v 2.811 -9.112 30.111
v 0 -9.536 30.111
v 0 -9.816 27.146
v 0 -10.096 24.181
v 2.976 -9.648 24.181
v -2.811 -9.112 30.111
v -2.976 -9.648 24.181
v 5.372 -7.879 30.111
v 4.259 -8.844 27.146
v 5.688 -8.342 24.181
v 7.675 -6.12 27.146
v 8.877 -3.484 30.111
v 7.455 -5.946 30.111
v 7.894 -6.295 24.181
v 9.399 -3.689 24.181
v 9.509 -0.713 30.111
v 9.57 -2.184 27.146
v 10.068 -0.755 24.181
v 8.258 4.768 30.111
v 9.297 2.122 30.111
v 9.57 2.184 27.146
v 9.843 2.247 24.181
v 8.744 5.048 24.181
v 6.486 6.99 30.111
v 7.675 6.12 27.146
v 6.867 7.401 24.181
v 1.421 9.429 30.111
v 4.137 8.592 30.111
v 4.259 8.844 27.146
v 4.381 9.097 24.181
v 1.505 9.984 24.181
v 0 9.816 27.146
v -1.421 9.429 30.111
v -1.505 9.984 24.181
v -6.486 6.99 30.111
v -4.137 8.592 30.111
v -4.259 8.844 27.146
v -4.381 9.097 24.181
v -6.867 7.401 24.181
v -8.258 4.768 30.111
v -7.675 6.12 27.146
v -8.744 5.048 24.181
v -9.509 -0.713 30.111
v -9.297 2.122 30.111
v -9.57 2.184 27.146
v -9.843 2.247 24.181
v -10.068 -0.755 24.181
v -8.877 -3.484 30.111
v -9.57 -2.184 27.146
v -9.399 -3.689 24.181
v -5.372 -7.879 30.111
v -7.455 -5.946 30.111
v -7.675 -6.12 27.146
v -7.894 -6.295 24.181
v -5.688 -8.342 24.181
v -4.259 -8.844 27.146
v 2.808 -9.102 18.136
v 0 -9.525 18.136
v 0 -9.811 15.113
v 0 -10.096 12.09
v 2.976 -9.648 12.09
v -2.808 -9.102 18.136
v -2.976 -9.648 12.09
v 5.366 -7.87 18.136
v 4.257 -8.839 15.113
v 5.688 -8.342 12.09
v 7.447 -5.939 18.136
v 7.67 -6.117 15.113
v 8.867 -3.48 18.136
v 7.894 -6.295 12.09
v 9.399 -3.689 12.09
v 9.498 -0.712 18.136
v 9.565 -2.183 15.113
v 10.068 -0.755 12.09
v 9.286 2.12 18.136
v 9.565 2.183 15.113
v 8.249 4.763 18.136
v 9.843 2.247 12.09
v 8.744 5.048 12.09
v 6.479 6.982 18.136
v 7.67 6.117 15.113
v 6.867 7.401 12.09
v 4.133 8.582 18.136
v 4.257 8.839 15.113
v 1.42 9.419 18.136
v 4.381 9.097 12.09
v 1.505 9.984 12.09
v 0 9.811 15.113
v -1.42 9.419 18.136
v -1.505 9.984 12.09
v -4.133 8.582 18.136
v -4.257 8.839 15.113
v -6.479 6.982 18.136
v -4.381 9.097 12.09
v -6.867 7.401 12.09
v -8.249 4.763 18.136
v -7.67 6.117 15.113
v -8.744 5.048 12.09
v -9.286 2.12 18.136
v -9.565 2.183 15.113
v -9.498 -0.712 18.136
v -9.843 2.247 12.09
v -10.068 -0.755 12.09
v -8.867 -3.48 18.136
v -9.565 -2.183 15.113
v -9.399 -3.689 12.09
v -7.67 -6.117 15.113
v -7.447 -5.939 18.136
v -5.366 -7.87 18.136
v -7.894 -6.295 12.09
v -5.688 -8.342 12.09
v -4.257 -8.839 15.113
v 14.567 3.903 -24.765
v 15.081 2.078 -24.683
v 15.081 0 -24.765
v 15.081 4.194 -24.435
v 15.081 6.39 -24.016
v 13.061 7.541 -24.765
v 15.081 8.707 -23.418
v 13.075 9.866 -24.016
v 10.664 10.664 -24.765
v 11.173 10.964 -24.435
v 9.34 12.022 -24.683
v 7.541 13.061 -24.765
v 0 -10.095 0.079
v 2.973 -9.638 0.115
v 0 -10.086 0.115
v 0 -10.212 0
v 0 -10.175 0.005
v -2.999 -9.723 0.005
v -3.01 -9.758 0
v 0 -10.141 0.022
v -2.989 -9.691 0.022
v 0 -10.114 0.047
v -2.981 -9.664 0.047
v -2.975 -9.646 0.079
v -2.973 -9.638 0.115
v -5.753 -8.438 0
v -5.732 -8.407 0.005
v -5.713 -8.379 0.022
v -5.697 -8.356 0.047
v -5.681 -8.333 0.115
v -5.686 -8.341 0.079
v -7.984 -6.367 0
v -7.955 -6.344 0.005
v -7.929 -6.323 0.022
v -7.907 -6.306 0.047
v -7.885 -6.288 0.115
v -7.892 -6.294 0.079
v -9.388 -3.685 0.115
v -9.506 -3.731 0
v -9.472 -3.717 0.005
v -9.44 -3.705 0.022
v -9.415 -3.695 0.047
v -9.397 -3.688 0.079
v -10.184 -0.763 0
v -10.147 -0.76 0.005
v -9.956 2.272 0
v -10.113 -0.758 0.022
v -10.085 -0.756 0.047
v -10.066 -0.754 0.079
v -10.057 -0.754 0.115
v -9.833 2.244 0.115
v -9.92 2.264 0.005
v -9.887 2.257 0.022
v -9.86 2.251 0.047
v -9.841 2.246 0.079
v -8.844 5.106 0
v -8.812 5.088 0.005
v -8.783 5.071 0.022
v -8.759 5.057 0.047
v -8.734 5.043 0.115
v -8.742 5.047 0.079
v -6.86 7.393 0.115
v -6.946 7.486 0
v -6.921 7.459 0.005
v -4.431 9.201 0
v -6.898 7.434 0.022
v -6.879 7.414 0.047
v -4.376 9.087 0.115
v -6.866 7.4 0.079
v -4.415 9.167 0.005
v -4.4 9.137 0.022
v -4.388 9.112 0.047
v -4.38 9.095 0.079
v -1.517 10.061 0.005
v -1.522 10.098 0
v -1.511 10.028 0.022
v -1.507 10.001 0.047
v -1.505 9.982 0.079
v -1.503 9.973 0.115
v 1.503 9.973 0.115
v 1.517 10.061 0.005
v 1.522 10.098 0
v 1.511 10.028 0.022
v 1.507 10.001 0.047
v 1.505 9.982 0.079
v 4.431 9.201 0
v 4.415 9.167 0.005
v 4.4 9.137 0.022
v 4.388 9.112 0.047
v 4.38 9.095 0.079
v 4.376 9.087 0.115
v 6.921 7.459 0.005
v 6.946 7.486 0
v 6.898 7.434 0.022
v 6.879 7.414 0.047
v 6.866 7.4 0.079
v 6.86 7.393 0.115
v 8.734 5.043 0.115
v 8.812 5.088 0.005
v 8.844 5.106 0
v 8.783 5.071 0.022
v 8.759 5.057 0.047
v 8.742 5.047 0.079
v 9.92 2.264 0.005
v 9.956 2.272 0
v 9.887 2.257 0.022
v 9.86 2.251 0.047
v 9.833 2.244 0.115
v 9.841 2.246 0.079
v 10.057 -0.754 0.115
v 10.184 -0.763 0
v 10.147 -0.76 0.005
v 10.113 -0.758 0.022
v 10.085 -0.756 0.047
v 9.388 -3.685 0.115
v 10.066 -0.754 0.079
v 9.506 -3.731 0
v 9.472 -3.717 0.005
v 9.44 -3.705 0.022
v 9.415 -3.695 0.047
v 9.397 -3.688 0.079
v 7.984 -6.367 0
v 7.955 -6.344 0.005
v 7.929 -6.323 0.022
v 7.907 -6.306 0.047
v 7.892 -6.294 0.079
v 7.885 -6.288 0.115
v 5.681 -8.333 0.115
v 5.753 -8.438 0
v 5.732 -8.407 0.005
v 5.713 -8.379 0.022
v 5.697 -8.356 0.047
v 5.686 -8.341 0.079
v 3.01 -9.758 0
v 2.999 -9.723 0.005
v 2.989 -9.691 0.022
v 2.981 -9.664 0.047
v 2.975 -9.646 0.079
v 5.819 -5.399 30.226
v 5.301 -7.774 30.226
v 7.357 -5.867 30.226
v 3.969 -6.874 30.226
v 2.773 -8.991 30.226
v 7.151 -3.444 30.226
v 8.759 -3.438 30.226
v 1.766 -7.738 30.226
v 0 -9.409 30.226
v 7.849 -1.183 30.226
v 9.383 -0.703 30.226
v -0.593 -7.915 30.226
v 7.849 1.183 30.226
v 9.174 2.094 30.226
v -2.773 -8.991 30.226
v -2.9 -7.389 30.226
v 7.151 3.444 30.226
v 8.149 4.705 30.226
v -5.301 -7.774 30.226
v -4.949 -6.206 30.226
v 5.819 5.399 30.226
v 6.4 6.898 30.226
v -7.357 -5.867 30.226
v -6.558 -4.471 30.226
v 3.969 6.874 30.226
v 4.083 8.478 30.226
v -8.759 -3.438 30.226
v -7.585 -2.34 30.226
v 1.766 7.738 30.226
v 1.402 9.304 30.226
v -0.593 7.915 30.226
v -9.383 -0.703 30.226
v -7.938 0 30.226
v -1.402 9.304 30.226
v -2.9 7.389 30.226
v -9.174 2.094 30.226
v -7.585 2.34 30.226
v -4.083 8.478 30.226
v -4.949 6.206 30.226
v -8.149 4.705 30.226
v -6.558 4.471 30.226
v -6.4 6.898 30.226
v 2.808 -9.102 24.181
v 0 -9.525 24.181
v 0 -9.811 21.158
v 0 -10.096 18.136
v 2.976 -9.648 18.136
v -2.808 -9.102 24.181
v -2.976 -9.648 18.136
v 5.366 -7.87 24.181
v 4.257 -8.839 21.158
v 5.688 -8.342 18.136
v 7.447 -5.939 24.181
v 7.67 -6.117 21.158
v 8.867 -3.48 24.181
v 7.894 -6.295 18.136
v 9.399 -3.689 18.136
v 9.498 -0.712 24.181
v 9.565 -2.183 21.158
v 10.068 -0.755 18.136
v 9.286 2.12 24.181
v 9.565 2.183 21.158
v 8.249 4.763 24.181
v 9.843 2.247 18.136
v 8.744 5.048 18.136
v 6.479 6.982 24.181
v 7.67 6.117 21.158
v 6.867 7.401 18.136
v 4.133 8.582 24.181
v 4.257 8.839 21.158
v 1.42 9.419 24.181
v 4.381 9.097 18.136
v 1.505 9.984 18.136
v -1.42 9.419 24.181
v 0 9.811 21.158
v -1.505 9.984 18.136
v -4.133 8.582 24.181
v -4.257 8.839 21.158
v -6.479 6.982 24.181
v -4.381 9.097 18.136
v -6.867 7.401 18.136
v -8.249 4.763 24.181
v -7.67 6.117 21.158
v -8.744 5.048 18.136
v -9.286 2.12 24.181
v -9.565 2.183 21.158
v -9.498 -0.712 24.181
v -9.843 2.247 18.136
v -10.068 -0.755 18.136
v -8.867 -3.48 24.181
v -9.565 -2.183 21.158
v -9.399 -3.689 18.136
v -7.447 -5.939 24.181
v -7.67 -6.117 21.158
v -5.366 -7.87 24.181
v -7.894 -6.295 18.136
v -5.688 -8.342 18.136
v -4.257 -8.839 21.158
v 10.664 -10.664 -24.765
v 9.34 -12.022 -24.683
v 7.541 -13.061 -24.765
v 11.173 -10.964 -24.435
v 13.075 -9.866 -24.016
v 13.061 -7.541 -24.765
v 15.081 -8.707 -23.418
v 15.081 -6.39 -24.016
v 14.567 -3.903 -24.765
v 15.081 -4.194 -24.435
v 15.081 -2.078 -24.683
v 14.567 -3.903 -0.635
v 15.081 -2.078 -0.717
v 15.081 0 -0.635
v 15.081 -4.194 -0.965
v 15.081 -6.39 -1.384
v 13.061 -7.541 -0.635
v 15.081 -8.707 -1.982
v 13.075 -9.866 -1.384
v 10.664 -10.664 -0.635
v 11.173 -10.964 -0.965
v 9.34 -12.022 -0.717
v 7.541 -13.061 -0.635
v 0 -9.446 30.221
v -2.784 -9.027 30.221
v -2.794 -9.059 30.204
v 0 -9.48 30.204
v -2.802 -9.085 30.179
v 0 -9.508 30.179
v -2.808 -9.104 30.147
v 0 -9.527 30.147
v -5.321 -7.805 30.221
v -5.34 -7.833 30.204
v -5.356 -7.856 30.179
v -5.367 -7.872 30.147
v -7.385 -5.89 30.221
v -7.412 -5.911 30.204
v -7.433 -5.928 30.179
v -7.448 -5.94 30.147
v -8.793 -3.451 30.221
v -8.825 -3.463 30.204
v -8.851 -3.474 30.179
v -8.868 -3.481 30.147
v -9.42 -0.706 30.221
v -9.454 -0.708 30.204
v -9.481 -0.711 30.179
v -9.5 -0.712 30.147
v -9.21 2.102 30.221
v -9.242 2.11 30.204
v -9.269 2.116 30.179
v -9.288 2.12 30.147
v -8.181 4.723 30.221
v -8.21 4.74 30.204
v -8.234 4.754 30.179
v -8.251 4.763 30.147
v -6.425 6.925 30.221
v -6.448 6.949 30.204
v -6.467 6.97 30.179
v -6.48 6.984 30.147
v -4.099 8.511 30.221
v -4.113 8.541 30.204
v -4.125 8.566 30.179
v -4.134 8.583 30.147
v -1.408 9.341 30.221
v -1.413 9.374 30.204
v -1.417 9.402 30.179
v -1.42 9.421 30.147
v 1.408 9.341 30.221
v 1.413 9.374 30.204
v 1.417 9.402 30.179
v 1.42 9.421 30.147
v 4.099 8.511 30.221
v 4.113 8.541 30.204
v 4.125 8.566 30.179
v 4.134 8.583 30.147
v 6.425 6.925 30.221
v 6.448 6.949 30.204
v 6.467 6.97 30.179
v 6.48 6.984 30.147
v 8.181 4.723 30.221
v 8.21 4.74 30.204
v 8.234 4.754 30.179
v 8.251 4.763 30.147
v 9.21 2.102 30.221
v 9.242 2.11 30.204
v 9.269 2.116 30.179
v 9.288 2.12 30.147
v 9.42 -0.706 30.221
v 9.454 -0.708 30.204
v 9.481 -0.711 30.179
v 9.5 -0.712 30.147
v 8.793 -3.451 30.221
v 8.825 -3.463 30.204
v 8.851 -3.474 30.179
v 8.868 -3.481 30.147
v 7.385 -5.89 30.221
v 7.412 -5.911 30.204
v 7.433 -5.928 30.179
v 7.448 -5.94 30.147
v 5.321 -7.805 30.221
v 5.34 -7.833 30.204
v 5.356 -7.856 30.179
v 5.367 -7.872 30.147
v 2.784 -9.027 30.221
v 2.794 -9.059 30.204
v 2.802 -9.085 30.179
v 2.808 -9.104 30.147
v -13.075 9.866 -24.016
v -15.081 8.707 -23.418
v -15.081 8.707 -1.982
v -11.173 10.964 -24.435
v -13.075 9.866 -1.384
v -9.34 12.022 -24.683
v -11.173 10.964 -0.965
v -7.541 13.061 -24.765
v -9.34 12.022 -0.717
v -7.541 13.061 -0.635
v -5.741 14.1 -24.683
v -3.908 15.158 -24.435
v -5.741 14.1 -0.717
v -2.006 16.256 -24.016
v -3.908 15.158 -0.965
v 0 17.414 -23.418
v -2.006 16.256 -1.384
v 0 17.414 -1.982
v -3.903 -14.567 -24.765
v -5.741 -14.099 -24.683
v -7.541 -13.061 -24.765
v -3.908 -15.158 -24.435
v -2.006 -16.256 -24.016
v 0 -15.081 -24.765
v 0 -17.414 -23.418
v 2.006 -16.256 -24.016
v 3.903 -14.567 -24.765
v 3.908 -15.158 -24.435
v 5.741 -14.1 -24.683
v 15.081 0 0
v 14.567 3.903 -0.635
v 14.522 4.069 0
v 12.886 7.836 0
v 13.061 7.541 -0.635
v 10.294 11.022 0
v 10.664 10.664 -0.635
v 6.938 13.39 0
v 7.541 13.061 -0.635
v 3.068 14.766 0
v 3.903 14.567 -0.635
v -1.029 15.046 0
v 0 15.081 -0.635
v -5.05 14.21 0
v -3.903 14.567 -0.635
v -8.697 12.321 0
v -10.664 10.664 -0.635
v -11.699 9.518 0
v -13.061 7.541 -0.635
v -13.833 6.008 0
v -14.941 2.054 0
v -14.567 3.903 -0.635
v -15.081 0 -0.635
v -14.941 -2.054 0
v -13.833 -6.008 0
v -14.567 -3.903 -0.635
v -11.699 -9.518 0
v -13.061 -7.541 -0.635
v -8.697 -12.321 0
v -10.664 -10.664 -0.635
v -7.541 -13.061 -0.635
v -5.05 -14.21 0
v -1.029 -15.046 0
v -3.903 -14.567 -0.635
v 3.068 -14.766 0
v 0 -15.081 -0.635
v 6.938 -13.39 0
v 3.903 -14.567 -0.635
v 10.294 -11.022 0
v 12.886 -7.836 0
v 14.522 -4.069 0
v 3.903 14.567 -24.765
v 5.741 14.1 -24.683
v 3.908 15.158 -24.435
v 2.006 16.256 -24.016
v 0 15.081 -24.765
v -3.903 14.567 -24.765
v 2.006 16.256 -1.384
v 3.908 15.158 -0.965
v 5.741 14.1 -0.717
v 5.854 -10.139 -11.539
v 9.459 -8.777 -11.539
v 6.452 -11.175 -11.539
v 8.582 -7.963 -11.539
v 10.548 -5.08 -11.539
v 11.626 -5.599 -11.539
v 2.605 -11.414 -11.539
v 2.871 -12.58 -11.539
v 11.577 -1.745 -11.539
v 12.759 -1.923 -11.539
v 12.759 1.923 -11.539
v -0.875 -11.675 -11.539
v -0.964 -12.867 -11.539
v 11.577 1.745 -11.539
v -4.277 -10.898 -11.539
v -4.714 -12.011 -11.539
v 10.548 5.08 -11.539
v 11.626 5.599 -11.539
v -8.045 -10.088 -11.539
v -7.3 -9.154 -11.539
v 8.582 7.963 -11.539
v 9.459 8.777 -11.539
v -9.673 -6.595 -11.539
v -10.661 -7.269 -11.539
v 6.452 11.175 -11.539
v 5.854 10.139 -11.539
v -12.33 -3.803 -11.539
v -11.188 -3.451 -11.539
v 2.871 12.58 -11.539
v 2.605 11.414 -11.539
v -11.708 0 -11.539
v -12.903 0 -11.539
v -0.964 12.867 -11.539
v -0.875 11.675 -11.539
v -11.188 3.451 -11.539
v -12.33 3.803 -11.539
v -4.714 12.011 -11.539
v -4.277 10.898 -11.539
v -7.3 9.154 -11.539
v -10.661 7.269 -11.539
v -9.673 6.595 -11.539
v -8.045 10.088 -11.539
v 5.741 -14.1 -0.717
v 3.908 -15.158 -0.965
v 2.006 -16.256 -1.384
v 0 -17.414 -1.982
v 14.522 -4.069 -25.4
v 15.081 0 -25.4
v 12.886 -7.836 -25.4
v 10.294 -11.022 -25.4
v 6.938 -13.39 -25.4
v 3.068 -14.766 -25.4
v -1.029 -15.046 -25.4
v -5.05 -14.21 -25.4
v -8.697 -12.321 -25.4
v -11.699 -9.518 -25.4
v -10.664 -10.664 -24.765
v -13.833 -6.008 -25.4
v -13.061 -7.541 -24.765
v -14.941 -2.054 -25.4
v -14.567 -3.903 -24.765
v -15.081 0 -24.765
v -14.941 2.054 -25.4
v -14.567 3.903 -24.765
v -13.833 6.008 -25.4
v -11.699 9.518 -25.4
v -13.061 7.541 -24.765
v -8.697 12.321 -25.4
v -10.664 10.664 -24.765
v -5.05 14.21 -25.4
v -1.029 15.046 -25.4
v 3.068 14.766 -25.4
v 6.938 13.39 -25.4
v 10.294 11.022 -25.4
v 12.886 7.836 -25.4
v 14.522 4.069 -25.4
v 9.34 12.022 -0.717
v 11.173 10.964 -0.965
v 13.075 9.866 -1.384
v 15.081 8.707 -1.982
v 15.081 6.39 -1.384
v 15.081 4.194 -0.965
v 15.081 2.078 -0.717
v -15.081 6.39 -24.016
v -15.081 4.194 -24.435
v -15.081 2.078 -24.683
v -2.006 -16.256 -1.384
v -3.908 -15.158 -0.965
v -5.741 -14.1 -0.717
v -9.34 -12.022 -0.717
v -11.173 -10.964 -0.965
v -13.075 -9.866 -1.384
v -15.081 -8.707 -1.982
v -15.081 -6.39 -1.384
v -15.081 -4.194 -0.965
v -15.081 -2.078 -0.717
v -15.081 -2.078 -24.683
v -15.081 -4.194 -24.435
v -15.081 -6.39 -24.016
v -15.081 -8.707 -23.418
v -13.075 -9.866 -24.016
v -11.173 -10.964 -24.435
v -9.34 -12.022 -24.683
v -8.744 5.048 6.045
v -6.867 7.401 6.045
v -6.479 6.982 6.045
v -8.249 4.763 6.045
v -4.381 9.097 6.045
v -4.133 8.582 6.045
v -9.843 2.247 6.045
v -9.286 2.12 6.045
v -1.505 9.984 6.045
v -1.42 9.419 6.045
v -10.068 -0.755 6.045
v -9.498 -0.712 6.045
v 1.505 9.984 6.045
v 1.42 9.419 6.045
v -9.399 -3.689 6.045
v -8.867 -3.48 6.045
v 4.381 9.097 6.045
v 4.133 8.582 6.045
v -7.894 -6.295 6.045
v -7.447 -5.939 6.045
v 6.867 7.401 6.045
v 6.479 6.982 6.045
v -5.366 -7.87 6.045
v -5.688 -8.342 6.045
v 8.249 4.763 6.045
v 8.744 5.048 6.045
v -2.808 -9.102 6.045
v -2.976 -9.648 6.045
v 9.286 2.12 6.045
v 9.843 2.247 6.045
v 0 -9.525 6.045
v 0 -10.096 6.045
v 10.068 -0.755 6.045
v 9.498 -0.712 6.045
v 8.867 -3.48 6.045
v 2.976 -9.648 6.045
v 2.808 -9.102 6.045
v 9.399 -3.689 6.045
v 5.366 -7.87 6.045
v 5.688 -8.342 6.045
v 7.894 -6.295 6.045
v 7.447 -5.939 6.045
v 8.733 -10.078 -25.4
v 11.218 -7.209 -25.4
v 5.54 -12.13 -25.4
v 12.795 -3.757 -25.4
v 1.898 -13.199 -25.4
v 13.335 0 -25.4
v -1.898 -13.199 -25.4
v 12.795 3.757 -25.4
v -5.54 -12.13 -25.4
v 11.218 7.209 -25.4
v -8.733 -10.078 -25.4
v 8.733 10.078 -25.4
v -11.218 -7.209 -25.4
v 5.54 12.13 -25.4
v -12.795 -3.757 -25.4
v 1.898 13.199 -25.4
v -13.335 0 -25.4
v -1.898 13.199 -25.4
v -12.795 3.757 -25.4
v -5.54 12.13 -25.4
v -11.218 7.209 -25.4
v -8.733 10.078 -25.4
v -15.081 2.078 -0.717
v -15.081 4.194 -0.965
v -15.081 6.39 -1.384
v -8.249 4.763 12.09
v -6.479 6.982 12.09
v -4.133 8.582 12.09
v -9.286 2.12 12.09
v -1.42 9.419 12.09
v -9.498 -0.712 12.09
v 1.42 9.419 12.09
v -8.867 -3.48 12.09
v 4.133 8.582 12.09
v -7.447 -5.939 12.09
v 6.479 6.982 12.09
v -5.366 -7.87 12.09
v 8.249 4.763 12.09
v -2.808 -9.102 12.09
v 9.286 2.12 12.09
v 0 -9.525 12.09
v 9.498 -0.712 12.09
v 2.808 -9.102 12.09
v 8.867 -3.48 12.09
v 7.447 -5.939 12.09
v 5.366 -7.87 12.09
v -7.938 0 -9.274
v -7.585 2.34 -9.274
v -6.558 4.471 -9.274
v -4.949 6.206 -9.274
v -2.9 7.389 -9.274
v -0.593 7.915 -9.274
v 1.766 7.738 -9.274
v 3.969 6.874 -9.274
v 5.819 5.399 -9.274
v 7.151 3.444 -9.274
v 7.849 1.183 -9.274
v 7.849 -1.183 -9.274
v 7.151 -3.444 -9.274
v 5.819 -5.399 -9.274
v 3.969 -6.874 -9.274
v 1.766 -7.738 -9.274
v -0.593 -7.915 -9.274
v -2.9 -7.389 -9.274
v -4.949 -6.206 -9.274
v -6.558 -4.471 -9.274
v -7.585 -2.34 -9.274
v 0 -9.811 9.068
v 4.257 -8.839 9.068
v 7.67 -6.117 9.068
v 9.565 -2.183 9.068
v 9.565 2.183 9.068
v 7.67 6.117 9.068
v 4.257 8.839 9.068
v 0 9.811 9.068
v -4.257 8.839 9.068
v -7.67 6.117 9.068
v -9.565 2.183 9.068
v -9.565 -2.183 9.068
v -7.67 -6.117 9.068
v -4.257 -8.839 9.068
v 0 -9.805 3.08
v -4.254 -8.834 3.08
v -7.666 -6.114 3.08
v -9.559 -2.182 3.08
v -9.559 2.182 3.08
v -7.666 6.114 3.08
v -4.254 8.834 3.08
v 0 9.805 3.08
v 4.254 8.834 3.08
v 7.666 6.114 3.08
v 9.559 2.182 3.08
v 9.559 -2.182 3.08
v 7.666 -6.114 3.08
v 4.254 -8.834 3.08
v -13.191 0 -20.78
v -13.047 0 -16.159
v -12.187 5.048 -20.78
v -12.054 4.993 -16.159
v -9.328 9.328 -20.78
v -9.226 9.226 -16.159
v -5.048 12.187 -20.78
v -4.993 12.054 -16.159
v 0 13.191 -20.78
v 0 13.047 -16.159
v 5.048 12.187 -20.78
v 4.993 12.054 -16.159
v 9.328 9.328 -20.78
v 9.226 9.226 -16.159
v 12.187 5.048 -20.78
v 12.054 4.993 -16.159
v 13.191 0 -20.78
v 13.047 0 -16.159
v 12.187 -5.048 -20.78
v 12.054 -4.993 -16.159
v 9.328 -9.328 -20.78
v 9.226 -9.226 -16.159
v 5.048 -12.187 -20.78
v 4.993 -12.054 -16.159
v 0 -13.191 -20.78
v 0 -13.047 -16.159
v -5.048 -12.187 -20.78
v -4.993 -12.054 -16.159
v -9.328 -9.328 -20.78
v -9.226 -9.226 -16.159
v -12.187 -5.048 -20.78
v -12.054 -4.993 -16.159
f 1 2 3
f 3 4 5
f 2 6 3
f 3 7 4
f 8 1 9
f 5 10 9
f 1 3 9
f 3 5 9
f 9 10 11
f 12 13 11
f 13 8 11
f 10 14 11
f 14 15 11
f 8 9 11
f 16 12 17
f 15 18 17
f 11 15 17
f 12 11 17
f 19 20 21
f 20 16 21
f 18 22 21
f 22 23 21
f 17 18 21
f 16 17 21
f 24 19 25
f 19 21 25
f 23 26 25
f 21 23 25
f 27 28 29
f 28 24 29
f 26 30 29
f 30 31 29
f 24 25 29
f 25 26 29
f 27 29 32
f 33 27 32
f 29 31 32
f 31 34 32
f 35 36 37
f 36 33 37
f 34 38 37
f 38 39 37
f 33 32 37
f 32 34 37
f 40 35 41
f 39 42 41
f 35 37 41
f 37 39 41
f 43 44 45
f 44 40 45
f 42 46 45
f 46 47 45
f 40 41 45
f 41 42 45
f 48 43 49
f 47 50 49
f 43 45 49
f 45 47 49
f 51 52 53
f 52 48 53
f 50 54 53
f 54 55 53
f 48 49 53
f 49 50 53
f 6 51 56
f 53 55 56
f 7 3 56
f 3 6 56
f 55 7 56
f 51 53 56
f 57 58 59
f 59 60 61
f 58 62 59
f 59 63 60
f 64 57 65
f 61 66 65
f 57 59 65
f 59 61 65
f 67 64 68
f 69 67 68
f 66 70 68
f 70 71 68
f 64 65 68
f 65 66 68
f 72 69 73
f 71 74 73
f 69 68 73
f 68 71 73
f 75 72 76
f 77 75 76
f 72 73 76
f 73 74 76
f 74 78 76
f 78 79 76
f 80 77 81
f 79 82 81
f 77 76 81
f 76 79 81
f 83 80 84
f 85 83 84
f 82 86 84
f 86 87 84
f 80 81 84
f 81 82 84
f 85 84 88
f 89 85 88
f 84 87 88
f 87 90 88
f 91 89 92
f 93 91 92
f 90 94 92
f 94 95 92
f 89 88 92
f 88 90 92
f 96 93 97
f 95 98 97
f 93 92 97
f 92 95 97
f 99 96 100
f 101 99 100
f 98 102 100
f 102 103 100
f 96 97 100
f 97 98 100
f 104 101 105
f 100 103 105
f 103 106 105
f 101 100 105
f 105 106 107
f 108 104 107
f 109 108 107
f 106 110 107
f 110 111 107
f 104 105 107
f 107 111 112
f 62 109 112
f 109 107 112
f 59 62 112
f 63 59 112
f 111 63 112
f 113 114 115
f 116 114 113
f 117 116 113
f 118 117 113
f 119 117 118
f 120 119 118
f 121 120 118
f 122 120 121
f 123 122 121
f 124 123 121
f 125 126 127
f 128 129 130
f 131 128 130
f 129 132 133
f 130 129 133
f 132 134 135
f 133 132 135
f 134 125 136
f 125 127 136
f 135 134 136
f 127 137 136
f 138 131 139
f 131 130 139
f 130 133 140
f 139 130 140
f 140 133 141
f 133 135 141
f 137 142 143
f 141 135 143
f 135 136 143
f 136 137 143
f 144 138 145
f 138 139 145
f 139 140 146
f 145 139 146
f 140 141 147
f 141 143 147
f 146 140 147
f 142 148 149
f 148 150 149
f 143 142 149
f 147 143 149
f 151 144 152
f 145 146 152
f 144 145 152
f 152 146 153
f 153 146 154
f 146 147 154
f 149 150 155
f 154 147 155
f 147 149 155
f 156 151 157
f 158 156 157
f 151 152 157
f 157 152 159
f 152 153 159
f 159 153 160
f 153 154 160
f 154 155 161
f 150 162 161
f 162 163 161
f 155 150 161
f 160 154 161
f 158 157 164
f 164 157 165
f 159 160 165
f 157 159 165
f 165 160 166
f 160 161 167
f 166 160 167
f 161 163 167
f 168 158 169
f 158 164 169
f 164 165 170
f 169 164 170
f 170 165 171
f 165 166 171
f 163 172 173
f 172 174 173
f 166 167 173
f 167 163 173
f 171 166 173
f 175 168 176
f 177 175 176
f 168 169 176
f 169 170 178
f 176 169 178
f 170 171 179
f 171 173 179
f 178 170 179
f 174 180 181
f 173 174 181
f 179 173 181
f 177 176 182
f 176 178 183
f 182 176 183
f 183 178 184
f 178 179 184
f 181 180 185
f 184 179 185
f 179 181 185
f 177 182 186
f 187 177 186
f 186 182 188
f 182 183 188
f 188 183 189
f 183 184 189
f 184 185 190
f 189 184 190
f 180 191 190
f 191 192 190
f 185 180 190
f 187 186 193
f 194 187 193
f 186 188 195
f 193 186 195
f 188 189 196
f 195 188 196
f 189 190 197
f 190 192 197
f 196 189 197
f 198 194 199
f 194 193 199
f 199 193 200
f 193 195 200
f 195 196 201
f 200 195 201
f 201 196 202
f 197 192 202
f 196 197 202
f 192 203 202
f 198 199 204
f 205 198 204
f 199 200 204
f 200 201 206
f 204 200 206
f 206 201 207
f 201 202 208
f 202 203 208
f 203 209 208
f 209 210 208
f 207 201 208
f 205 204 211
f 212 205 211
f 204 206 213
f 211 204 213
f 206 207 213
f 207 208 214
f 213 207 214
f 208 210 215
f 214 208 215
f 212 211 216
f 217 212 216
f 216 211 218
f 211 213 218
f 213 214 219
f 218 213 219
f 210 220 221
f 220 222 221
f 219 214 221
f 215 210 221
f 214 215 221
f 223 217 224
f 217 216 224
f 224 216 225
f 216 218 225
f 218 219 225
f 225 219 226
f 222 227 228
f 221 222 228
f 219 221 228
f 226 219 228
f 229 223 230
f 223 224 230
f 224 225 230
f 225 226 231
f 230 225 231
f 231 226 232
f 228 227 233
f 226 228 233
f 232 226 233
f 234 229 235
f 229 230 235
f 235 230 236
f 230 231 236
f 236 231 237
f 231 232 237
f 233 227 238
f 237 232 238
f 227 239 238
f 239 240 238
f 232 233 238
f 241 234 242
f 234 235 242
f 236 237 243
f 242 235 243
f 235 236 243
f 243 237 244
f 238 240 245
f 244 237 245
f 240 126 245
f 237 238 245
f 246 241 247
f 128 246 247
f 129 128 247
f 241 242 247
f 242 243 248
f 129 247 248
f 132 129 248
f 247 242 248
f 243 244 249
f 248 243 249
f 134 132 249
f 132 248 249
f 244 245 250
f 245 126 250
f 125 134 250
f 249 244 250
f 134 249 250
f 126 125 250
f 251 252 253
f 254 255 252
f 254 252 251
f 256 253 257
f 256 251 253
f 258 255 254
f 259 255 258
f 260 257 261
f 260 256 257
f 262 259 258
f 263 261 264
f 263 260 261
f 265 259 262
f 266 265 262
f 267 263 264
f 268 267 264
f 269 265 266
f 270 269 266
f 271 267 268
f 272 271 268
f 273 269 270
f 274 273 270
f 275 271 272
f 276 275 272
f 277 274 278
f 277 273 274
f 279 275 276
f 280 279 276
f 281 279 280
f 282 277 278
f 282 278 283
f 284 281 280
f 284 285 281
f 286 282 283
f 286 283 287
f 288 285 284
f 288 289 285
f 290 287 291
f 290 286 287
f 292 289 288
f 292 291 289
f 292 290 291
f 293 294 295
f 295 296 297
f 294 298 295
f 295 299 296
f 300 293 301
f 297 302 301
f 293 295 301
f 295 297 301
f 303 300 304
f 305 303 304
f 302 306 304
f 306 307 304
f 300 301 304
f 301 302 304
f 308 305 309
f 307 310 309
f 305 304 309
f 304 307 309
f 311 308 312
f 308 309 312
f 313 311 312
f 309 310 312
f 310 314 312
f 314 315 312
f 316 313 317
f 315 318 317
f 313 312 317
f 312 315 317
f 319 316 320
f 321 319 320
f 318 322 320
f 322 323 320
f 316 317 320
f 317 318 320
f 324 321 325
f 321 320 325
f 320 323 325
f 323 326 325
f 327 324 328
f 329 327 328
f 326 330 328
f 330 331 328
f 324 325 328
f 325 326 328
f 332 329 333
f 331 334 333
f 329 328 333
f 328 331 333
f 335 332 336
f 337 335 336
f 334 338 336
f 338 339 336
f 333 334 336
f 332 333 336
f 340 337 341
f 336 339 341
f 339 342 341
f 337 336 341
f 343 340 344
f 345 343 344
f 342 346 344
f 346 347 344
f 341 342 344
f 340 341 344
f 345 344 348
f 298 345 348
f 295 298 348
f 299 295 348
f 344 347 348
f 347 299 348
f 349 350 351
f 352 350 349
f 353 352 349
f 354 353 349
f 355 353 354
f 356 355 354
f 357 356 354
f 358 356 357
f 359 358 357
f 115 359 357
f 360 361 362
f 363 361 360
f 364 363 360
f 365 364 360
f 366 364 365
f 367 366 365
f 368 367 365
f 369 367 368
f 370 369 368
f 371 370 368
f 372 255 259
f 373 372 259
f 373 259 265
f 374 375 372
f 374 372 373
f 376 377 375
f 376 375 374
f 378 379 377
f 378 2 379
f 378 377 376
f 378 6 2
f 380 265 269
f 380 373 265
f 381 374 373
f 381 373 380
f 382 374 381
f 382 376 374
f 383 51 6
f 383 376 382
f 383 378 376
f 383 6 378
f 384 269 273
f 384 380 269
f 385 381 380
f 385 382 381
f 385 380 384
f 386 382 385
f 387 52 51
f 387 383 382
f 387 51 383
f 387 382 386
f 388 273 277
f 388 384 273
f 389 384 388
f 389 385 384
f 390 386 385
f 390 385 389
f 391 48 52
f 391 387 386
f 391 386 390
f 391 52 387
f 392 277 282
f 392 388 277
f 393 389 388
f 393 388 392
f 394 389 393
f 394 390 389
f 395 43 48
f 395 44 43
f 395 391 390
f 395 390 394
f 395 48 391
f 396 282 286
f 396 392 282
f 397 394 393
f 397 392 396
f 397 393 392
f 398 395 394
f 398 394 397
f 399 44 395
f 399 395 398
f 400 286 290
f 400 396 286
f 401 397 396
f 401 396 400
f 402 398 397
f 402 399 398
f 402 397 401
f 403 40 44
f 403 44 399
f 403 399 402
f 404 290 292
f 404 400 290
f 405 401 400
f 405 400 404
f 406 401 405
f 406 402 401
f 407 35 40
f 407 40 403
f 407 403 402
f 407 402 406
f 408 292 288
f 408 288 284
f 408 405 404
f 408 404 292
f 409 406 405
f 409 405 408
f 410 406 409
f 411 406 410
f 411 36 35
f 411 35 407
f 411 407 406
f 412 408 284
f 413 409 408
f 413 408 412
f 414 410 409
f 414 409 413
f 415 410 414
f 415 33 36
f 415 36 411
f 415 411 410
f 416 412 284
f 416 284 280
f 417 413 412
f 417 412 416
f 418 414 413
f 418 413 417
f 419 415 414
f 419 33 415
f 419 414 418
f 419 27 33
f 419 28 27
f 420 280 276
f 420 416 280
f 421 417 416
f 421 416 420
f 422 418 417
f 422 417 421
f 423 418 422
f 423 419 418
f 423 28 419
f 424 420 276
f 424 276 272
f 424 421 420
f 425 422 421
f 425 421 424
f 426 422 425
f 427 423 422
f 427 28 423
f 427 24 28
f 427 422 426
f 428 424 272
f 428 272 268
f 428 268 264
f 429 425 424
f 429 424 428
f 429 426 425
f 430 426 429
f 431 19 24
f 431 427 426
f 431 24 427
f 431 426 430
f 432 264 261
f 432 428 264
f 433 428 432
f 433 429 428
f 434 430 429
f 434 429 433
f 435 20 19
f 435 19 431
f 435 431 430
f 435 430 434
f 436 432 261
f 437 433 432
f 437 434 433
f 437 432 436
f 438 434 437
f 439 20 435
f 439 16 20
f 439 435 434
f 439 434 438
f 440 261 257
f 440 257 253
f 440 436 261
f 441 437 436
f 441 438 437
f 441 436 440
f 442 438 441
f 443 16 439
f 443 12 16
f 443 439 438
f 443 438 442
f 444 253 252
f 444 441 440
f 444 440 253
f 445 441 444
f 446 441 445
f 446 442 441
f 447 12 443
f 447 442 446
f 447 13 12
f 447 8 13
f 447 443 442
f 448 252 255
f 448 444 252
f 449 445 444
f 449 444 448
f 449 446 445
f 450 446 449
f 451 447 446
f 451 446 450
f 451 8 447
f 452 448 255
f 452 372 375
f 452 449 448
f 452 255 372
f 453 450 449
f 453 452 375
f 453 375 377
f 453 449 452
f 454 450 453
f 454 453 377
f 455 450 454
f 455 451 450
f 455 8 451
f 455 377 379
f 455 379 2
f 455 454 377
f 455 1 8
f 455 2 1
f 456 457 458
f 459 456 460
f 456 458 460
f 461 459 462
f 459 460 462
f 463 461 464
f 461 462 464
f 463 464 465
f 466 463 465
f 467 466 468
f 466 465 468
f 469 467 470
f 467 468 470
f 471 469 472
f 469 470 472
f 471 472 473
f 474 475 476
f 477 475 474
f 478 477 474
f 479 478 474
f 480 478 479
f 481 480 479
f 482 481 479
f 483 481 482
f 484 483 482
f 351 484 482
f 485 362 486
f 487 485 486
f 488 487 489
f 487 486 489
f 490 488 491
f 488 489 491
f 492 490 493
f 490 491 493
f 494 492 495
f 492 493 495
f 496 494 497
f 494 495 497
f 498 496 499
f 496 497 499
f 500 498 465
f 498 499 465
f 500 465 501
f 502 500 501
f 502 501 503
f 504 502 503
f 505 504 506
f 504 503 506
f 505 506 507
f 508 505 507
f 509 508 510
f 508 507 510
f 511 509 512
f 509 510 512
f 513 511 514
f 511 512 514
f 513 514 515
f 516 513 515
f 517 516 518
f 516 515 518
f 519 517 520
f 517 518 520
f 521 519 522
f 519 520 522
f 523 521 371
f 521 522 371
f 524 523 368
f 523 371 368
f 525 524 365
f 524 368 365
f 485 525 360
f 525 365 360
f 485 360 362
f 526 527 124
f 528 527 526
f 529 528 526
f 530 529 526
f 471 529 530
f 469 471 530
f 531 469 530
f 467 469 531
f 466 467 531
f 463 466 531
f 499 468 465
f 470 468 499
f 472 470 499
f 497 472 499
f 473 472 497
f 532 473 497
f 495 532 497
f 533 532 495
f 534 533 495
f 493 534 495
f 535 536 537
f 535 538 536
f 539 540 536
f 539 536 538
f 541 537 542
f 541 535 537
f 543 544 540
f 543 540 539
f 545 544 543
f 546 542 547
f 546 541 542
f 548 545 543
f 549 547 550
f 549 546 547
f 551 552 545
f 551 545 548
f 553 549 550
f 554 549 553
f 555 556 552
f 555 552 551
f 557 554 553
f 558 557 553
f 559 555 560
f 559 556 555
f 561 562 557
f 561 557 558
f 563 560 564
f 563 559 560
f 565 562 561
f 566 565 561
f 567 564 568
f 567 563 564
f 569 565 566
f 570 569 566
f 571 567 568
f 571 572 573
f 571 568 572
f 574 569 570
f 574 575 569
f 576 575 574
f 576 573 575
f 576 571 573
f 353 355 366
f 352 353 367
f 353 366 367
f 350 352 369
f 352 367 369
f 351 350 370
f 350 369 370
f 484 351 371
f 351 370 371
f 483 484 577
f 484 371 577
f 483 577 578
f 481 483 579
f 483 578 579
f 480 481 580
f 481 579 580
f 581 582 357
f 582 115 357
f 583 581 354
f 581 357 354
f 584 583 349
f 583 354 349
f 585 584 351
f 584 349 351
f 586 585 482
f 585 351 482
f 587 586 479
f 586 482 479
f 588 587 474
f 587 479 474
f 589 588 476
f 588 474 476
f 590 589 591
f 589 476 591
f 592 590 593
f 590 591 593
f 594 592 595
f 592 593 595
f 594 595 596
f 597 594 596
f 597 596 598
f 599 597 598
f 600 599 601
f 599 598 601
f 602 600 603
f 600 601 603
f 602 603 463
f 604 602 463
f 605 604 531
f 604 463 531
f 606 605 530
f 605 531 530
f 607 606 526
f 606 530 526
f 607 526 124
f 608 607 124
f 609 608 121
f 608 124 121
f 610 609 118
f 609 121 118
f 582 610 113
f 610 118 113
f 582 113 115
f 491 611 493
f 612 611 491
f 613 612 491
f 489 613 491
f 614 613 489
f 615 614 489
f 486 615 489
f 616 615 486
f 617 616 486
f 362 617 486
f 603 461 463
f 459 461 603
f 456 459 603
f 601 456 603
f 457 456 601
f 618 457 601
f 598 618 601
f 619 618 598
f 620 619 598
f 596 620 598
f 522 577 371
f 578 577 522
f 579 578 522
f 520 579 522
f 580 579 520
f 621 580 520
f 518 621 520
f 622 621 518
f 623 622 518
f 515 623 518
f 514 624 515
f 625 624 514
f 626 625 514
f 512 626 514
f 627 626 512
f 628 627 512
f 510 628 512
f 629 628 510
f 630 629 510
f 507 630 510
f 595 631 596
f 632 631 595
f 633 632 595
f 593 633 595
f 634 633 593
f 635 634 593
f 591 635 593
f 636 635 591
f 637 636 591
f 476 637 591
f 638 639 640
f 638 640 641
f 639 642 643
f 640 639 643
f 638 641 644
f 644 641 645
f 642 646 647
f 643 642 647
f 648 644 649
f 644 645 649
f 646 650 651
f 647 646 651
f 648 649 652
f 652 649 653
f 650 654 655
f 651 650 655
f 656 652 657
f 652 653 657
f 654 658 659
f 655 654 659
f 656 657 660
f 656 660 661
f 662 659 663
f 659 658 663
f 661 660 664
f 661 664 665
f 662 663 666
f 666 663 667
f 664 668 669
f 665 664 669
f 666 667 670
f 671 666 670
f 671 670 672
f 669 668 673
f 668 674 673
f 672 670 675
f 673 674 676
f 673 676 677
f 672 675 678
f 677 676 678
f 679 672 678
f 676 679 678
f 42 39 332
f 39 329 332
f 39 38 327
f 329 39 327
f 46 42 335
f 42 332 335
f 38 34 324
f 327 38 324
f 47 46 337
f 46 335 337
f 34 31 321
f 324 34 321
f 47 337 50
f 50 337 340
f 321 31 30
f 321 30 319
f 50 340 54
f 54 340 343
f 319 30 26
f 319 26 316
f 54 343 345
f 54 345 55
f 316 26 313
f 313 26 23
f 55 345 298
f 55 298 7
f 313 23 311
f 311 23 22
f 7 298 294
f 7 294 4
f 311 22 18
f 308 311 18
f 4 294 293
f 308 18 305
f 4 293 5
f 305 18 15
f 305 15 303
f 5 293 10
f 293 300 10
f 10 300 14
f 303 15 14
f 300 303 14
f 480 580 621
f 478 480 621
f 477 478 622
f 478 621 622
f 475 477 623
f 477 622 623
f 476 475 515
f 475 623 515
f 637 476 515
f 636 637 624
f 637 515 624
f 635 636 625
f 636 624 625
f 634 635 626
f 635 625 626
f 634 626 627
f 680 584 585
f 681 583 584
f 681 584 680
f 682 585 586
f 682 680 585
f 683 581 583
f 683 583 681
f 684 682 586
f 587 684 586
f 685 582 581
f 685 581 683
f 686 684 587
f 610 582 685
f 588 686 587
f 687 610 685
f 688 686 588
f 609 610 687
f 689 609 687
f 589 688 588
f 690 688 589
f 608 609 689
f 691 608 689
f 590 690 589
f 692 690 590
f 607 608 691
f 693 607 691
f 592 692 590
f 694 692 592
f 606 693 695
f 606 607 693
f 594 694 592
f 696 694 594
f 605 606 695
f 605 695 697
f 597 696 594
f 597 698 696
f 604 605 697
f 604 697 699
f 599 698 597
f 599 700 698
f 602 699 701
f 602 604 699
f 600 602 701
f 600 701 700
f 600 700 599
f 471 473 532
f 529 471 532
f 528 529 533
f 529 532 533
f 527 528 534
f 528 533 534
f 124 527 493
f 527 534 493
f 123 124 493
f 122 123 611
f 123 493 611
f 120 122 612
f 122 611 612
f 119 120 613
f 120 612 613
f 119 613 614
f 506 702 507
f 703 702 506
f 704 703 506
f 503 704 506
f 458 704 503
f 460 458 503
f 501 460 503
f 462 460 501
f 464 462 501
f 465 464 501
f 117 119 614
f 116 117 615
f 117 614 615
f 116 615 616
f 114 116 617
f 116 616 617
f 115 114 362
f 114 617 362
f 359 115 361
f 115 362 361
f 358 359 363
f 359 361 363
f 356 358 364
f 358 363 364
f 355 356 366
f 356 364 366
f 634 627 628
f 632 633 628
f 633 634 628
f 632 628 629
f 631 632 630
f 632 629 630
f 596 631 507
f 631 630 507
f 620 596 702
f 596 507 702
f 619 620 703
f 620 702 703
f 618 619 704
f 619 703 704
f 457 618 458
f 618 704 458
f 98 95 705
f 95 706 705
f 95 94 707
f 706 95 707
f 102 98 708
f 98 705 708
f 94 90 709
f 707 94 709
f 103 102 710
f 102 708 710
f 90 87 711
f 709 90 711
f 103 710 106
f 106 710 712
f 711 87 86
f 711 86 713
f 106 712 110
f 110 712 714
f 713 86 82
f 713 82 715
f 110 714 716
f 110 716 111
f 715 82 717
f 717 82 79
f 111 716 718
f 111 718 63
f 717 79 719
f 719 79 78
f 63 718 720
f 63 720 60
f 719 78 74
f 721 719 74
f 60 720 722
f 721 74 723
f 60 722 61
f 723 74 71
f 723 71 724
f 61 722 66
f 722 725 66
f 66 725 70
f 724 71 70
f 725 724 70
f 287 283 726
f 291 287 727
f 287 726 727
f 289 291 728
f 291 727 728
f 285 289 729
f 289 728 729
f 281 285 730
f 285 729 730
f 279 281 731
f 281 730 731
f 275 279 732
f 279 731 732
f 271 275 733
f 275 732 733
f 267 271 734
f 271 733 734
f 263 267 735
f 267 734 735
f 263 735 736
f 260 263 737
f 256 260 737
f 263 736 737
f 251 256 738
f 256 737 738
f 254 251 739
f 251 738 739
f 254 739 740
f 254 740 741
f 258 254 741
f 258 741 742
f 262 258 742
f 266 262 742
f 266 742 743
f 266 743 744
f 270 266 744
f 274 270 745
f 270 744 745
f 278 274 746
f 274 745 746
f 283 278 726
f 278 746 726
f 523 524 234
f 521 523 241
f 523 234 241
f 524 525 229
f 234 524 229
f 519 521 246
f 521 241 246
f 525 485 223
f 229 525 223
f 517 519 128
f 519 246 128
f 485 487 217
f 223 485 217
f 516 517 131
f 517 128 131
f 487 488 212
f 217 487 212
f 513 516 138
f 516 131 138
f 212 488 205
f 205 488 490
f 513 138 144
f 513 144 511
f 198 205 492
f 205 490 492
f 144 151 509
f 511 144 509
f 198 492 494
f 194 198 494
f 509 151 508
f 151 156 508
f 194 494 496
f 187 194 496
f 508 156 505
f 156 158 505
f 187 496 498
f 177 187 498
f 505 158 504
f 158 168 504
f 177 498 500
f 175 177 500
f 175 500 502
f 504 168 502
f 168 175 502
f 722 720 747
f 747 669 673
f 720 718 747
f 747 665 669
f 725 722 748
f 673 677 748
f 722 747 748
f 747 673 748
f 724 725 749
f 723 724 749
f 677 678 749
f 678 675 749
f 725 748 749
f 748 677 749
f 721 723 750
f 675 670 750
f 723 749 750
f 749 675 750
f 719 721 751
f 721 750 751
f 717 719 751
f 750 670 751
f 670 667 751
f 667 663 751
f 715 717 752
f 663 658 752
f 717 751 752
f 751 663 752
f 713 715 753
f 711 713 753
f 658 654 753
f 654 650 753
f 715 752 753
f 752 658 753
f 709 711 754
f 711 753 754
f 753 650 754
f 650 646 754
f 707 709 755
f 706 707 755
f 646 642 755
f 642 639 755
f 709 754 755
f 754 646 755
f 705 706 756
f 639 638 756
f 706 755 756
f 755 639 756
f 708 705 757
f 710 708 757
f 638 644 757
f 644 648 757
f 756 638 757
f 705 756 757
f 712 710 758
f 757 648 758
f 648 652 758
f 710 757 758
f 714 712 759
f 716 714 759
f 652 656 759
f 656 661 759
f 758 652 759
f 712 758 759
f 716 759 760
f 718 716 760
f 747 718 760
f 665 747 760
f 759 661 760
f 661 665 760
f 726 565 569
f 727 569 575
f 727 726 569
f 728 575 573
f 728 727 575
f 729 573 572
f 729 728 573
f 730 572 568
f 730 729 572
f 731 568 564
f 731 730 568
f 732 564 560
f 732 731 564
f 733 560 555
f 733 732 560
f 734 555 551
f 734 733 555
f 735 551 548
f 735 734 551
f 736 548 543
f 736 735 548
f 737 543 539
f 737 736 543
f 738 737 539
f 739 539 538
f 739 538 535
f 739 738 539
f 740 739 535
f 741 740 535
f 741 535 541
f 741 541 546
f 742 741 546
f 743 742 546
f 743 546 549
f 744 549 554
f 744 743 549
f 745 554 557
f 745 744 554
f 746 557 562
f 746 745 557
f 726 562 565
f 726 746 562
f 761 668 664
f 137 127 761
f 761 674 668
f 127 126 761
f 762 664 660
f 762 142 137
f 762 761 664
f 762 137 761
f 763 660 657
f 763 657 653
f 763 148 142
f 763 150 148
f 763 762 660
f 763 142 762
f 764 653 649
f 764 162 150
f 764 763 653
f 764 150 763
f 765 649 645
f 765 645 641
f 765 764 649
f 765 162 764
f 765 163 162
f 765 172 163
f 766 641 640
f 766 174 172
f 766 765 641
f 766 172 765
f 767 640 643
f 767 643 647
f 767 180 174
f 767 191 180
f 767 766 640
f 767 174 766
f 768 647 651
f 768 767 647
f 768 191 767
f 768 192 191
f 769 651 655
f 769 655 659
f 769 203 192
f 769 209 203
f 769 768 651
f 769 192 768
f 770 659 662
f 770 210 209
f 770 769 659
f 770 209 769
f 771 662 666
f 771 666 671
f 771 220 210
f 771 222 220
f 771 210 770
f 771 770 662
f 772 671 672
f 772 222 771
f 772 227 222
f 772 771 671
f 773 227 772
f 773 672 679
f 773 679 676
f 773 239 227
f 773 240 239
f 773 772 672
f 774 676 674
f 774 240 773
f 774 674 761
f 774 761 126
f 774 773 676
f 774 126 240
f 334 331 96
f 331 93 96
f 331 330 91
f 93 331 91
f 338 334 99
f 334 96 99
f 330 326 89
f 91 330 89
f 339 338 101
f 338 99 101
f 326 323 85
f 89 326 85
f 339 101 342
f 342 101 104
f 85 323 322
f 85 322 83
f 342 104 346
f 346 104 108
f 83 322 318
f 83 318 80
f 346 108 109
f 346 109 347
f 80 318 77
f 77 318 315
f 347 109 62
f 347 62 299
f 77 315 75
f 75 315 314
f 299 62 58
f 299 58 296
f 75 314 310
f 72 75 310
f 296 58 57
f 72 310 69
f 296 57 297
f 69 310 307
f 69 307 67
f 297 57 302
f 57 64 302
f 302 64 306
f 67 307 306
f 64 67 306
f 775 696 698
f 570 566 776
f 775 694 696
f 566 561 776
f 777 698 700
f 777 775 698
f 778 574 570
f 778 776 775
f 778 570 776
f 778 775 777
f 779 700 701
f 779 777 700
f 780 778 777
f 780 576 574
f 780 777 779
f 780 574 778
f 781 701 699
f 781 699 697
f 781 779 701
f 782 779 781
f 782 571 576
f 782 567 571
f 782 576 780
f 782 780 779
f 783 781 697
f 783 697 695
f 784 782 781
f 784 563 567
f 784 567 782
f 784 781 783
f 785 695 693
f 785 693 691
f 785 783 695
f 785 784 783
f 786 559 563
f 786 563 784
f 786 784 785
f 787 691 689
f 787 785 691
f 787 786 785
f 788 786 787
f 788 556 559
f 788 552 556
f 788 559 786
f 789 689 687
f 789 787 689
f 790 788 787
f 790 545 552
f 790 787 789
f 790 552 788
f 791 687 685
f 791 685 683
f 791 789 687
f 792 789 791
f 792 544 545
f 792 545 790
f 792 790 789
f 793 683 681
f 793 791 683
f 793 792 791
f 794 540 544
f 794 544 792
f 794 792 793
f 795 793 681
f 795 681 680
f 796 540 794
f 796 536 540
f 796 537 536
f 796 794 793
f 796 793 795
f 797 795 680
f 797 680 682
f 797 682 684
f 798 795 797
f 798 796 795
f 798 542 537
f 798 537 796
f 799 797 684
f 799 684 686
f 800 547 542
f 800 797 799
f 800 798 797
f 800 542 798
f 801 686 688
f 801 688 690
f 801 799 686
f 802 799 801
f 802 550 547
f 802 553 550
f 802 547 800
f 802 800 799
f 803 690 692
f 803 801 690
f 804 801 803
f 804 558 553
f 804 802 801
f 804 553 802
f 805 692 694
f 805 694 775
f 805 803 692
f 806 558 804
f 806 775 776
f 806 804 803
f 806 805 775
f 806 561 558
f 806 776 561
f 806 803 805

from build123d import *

# Parameters (mm, degrees)
LPATTERN1_COUNT              = 4
LPATTERN1_PITCH              = 6.0452
BOSS_EXTRUDE1_DEPTH          = 25.4
CUT_EXTRUDE1_START           = -0.635
SKETCH5_OUTSIDE_W            = 179.522
SKETCH5_OUTSIDE_H            = 184.188
SKETCH5_OUTSIDE_R            = 15.08125
CUT_EXTRUDE1_DEPTH           = 38.369131087
CUT_EXTRUDE1_TAPER           = 60
CUT_EXTRUDE1_OTHER_WAY_DEPTH = 0.635
CUT_EXTRUDE2_START           = -0.635
SKETCH6_OUTSIDE_W            = 256.438
SKETCH6_OUTSIDE_H            = 261.104
SKETCH6_OUTSIDE_R            = 15.08125
CUT_EXTRUDE2_DEPTH           = 60.572597358
CUT_EXTRUDE2_TAPER           = 60
CUT_EXTRUDE2_OTHER_WAY_DEPTH = 0.635
SKETCH7_W                    = 55.626
SKETCH7_H                    = 7.9375
FILLET1_R                    = 0.127


with BuildPart() as part:
    # Sketch2 → Revolve1 (revolve)
    with BuildSketch(Plane(origin=(0, 0, 0), x_dir=(0, 0, -1), z_dir=(1, 0, 0)), mode=Mode.PRIVATE) as revolve1_sk:
        Polygon((-30.226, 9.525), (-6.0452, 9.525), (0, 10.0965), (0, 0), (-30.226, 0), align=None)
    revolve(revolve1_sk.sketch.rotate(Axis((0, 0, 30.226), (0, 0, -1)), 180), axis=Axis((0, 0, 30.226), (0, 0, -1)))

    # Sketch3 → Revolve2 (revolve)
    with BuildSketch(Plane(origin=(0, 0, 0), x_dir=(0, 0, -1), z_dir=(1, 0, 0)), mode=Mode.PRIVATE) as revolve2_sk:
        Polygon((-30.226, 9.525), (-24.1808, 10.0965), (-24.1808, 9.525), align=None)
    revolve2 = revolve(revolve2_sk.sketch.rotate(Axis((0, 0, 0), (0, 0, 1)), 180), axis=Axis((0, 0, 0), (0, 0, 1)))

    # LPattern1: Revolve2 ×4
    with Locations(*[(0, 0, -i * LPATTERN1_PITCH) for i in range(1, LPATTERN1_COUNT)]):
        add(revolve2)

    # Sketch4 → Boss-Extrude1 (add)
    with BuildSketch(Plane(origin=(0, 0, 0), x_dir=(-1, 0, 0), z_dir=(0, 0, -1))):
        Polygon((0, 17.414327494), (-15.08125, 8.707163747), (-15.08125, -8.707163747), (0, -17.414327494), (15.08125, -8.707163747), (15.08125, 8.707163747), align=None)
    extrude(amount=BOSS_EXTRUDE1_DEPTH)

    # Sketch5 outside → Cut-Extrude1 (cut)
    with BuildSketch(Plane.XY.offset(CUT_EXTRUDE1_START)):
        Rectangle(SKETCH5_OUTSIDE_W, SKETCH5_OUTSIDE_H)
        Circle(SKETCH5_OUTSIDE_R, mode=Mode.SUBTRACT)
    extrude(amount=-CUT_EXTRUDE1_DEPTH, taper=CUT_EXTRUDE1_TAPER, mode=Mode.SUBTRACT)

    # Sketch5 outside → Cut-Extrude1 other way (cut)
    with BuildSketch(Plane.XY.offset(CUT_EXTRUDE1_START)):
        Rectangle(SKETCH5_OUTSIDE_W, SKETCH5_OUTSIDE_H)
        Circle(SKETCH5_OUTSIDE_R, mode=Mode.SUBTRACT)
    extrude(amount=CUT_EXTRUDE1_OTHER_WAY_DEPTH, mode=Mode.SUBTRACT)

    # Sketch6 outside → Cut-Extrude2 (cut)
    with BuildSketch(Plane(origin=(0, 0, -25.4), x_dir=(-1, 0, 0), z_dir=(0, 0, -1)).offset(CUT_EXTRUDE2_START)):
        Rectangle(SKETCH6_OUTSIDE_W, SKETCH6_OUTSIDE_H)
        with Locations(Location((0, 0, 0), (0, 0, 180))):
            Circle(SKETCH6_OUTSIDE_R, mode=Mode.SUBTRACT)
    extrude(amount=-CUT_EXTRUDE2_DEPTH, taper=CUT_EXTRUDE2_TAPER, mode=Mode.SUBTRACT)

    # Sketch6 outside → Cut-Extrude2 other way (cut)
    with BuildSketch(Plane(origin=(0, 0, -25.4), x_dir=(-1, 0, 0), z_dir=(0, 0, -1)).offset(CUT_EXTRUDE2_START)):
        Rectangle(SKETCH6_OUTSIDE_W, SKETCH6_OUTSIDE_H)
        with Locations(Location((0, 0, 0), (0, 0, 180))):
            Circle(SKETCH6_OUTSIDE_R, mode=Mode.SUBTRACT)
    extrude(amount=CUT_EXTRUDE2_OTHER_WAY_DEPTH, mode=Mode.SUBTRACT)

    # Sketch7 → Cut-Revolve1 (revolve, cut)
    with BuildSketch(Plane(origin=(0, 0, 0), x_dir=(0, 0, -1), z_dir=(1, 0, 0)), mode=Mode.PRIVATE) as cut_revolve1_sk:
        with Locations((-2.413, 3.96875)):
            Rectangle(SKETCH7_W, SKETCH7_H)
    revolve(cut_revolve1_sk.sketch.rotate(Axis((0, 0, 30.226), (0, 0, -1)), 270), axis=Axis((0, 0, 30.226), (0, 0, -1)), mode=Mode.SUBTRACT)

    # Sketch8 → Cut-Revolve2 (revolve, cut)
    with BuildSketch(Plane(origin=(0, 0, 0), x_dir=(0, 0, -1), z_dir=(1, 0, 0)), mode=Mode.PRIVATE) as cut_revolve2_sk:
        Polygon((25.4, 13.335), (11.53922, 12.903443324), (11.53922, 11.7078125), (4.504456534, 0), (25.4, 0), align=None)
    revolve(cut_revolve2_sk.sketch.rotate(Axis((0, 0, 30.226), (0, 0, -1)), 270), axis=Axis((0, 0, 30.226), (0, 0, -1)), mode=Mode.SUBTRACT)

    # Fillet1
    fillet1_edges = [part.edges().sort_by_distance(p)[0] for p in [
        (0, 9.525, 30.226),
        (0, 10.0965, 0),
    ]]
    fillet(fillet1_edges, radius=FILLET1_R)


solid = part.part
